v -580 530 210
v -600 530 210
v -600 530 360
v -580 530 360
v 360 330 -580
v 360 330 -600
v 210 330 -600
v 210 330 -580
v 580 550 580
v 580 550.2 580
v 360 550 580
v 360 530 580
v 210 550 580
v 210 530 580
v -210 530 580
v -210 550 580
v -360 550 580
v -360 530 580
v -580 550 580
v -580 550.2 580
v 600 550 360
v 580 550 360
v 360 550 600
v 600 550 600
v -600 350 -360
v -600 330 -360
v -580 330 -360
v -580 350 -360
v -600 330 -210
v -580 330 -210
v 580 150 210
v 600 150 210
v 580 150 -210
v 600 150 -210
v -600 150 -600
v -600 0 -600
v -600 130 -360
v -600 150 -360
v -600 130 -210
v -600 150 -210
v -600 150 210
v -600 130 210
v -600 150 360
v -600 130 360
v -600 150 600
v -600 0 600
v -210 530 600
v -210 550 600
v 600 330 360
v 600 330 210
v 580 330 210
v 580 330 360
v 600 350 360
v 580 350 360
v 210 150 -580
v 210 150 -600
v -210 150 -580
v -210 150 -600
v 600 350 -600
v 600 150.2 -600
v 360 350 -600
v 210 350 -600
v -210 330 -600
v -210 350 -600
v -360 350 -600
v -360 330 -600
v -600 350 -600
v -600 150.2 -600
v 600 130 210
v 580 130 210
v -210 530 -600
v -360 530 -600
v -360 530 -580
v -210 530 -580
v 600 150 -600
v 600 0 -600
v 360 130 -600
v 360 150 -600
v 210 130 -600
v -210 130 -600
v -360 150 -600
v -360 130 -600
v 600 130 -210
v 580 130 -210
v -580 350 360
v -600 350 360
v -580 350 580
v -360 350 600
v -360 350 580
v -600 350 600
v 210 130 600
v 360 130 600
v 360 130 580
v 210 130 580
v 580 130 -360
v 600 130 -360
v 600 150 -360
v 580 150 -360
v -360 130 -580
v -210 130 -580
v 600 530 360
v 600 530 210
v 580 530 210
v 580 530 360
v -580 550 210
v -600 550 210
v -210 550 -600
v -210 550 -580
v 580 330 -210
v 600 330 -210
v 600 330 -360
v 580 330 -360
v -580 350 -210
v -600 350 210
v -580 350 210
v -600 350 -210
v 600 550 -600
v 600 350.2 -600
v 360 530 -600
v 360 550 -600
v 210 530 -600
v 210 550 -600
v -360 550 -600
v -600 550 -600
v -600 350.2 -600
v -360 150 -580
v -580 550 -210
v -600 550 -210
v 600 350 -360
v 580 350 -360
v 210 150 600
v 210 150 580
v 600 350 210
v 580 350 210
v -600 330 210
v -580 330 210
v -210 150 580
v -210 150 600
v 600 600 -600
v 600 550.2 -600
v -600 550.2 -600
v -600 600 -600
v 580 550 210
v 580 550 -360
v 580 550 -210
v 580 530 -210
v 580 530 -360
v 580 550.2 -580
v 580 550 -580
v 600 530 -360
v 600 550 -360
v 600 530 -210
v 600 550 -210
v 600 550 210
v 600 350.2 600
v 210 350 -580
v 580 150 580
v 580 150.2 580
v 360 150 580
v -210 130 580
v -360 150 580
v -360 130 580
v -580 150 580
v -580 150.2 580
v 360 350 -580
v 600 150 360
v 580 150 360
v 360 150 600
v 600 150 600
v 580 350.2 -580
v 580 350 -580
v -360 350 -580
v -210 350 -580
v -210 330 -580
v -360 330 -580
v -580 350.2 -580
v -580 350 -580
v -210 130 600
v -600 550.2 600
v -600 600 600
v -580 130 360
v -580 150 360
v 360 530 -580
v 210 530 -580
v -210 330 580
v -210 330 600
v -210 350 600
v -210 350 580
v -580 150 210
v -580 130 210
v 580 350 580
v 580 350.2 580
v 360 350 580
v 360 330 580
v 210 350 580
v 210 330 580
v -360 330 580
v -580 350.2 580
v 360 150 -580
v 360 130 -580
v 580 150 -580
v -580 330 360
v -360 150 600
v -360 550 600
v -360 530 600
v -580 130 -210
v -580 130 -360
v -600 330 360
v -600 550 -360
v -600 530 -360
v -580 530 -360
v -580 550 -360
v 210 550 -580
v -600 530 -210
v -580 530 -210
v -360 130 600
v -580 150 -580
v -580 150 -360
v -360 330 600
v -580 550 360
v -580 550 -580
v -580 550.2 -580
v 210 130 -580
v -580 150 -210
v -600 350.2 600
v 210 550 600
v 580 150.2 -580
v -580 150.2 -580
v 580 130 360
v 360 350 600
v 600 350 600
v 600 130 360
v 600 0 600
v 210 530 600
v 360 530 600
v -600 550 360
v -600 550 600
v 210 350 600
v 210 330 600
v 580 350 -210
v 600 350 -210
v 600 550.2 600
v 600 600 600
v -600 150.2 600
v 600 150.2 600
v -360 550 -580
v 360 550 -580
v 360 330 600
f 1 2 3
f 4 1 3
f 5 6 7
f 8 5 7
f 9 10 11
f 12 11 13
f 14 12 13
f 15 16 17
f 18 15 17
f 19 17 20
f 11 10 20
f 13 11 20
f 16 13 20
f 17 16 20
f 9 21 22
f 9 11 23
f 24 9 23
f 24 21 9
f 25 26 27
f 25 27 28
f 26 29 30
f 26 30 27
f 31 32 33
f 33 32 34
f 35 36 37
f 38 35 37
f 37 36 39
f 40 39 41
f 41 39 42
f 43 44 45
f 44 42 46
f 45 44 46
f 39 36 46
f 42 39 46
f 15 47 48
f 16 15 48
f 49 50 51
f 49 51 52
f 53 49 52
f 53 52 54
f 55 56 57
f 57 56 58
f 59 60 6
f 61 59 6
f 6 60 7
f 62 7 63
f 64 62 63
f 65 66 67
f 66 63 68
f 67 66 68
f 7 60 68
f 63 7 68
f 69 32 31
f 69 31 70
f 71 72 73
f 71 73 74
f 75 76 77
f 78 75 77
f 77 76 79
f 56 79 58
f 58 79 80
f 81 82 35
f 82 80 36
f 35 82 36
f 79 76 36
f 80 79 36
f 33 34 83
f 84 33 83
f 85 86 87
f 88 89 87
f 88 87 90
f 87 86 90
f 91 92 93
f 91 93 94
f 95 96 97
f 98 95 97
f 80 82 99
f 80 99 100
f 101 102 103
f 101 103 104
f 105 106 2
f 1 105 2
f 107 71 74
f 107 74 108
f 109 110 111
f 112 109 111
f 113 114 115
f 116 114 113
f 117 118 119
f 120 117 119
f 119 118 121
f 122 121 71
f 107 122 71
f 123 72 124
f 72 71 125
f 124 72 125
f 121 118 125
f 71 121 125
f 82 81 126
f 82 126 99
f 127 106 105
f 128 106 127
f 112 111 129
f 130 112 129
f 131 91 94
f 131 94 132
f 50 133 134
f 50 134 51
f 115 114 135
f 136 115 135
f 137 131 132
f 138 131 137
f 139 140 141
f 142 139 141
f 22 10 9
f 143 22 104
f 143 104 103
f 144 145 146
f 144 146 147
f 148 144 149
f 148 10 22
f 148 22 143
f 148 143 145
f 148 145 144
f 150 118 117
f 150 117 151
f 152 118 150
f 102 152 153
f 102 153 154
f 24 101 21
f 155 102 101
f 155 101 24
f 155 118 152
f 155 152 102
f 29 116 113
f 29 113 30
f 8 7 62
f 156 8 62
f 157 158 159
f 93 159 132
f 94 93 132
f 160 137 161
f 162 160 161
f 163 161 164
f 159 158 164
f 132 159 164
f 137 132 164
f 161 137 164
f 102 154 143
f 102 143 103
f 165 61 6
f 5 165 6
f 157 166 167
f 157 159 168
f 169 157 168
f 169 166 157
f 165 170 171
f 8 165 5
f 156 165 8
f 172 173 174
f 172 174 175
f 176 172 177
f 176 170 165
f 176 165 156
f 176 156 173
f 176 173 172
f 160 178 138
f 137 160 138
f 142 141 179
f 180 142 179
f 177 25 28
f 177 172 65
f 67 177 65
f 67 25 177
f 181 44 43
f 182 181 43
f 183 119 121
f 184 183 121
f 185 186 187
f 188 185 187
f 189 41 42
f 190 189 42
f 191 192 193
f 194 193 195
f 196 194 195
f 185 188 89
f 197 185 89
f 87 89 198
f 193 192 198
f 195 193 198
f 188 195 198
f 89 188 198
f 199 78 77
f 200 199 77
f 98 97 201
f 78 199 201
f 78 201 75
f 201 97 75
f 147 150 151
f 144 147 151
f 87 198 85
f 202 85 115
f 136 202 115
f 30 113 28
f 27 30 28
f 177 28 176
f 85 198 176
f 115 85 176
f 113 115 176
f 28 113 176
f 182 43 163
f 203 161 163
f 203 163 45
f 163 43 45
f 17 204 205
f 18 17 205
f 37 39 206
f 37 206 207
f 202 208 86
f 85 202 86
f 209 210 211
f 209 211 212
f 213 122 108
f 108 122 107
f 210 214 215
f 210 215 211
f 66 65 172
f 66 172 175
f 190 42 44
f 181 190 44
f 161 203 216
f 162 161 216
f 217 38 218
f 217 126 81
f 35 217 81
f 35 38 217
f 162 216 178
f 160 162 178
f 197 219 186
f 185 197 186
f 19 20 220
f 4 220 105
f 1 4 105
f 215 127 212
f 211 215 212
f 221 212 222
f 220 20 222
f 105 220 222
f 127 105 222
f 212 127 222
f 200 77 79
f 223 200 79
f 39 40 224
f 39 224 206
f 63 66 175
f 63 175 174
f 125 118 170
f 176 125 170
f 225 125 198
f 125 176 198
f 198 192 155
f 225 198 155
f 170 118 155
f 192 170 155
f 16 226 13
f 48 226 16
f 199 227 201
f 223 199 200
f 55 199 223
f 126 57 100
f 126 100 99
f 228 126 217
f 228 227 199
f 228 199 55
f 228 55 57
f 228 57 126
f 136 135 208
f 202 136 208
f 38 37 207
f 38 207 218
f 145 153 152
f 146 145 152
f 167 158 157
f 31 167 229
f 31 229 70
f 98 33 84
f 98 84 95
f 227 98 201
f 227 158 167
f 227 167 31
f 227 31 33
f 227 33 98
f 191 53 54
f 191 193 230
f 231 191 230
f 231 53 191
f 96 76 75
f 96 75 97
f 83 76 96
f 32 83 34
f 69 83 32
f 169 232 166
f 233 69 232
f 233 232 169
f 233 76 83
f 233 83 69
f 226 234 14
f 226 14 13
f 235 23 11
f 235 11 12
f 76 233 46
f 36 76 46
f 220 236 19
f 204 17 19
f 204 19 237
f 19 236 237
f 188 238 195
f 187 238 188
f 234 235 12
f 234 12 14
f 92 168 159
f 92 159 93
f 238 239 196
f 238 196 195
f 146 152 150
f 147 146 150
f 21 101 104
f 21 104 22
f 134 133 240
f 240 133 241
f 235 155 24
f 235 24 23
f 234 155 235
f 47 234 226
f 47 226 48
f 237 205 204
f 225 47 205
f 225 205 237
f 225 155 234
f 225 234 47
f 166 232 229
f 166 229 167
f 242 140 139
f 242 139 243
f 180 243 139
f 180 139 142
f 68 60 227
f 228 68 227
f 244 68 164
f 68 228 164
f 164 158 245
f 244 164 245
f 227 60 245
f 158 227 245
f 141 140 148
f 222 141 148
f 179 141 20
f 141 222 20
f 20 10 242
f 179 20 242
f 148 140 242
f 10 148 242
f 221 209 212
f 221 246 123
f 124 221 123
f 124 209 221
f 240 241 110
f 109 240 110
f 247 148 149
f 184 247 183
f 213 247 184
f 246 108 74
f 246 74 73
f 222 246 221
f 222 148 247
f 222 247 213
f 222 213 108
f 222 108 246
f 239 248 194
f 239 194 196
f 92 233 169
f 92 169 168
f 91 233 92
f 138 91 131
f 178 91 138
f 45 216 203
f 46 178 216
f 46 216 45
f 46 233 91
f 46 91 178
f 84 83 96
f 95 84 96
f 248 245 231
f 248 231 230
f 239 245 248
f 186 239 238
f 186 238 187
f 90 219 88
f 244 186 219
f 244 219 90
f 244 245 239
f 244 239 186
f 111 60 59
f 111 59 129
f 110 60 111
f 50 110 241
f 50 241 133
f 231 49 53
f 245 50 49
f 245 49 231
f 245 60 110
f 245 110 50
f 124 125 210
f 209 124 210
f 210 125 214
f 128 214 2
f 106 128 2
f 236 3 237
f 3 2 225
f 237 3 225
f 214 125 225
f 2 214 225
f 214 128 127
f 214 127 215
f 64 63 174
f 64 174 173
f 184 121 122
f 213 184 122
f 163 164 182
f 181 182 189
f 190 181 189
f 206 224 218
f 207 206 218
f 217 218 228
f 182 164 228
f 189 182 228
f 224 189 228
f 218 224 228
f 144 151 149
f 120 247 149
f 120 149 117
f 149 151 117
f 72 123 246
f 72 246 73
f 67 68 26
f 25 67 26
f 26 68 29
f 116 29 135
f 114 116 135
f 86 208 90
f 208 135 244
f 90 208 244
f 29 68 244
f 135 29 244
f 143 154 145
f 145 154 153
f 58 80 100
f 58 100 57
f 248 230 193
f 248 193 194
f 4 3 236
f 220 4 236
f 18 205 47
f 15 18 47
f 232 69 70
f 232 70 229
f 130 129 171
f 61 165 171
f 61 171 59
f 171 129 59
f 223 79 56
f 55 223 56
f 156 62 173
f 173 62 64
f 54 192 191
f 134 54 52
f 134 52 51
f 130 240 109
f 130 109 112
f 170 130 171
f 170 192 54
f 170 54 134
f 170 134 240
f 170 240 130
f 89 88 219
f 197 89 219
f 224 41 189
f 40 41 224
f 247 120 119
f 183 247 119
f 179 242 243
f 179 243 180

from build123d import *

# Parameters (mm, degrees)
SKETCH_1_W             = 600
SKETCH_1_H             = 600
EXTRUDE_1_DEPTH        = 600
CUT_EXTRUDE_1_DEPTH    = 20
CUT_EXTRUDE_2_DEPTH    = 20
PATTERN_LINEAR_1_COUNT = 3
PATTERN_LINEAR_1_PITCH = 200


with BuildPart() as part:
    # 草图1 → 凸台-拉伸1 (new body)
    with BuildSketch(Plane(origin=(0, 0, 0), x_dir=(1, 0, 0), z_dir=(0, 1, 0))):
        with Locations((-300, -300)):
            Rectangle(SKETCH_1_W, SKETCH_1_H)
    extrude(amount=EXTRUDE_1_DEPTH)

    # 草图2 → 切除-拉伸1 (cut)
    with BuildSketch(Plane.ZY.offset(600)):
        Polygon((600, 150.2), (0, 150.2), (0, 150), (210, 150), (210, 130), (360, 130), (360, 150), (600, 150), align=None)
    cut_extrude_1 = extrude(amount=-CUT_EXTRUDE_1_DEPTH, mode=Mode.SUBTRACT)

    # 草图3 → 切除-拉伸2 (cut)
    with BuildSketch(Plane.XY.offset(600)):
        Polygon((-580, 150.2), (-580, 150), (-360, 150), (-360, 130), (-210, 130), (-210, 150), (0, 150), (0, 150.2), align=None)
    cut_extrude_2 = extrude(amount=-CUT_EXTRUDE_2_DEPTH, mode=Mode.SUBTRACT)

    # 阵列(线性)1: 切除-拉伸1, 切除-拉伸2 ×3
    with Locations(*[(0, i * PATTERN_LINEAR_1_PITCH, 0) for i in range(1, PATTERN_LINEAR_1_COUNT)]):
        add(cut_extrude_1, mode=Mode.SUBTRACT)
        add(cut_extrude_2, mode=Mode.SUBTRACT)

    # 镜向1: part across plane


with BuildPart() as part_1:
    add(part.part)
    add(part.part.mirror(Plane(origin=(0, 600, 0), x_dir=(1, 0, 0), z_dir=(0, 0, 1))))

    # 镜向2: part across plane


with BuildPart() as part_2:
    add(part_1.part)
    add(part_1.part.mirror(Plane(origin=(0, 600, 0), x_dir=(0, 0, 1), z_dir=(-1, 0, 0))))


solid = part_2.part
